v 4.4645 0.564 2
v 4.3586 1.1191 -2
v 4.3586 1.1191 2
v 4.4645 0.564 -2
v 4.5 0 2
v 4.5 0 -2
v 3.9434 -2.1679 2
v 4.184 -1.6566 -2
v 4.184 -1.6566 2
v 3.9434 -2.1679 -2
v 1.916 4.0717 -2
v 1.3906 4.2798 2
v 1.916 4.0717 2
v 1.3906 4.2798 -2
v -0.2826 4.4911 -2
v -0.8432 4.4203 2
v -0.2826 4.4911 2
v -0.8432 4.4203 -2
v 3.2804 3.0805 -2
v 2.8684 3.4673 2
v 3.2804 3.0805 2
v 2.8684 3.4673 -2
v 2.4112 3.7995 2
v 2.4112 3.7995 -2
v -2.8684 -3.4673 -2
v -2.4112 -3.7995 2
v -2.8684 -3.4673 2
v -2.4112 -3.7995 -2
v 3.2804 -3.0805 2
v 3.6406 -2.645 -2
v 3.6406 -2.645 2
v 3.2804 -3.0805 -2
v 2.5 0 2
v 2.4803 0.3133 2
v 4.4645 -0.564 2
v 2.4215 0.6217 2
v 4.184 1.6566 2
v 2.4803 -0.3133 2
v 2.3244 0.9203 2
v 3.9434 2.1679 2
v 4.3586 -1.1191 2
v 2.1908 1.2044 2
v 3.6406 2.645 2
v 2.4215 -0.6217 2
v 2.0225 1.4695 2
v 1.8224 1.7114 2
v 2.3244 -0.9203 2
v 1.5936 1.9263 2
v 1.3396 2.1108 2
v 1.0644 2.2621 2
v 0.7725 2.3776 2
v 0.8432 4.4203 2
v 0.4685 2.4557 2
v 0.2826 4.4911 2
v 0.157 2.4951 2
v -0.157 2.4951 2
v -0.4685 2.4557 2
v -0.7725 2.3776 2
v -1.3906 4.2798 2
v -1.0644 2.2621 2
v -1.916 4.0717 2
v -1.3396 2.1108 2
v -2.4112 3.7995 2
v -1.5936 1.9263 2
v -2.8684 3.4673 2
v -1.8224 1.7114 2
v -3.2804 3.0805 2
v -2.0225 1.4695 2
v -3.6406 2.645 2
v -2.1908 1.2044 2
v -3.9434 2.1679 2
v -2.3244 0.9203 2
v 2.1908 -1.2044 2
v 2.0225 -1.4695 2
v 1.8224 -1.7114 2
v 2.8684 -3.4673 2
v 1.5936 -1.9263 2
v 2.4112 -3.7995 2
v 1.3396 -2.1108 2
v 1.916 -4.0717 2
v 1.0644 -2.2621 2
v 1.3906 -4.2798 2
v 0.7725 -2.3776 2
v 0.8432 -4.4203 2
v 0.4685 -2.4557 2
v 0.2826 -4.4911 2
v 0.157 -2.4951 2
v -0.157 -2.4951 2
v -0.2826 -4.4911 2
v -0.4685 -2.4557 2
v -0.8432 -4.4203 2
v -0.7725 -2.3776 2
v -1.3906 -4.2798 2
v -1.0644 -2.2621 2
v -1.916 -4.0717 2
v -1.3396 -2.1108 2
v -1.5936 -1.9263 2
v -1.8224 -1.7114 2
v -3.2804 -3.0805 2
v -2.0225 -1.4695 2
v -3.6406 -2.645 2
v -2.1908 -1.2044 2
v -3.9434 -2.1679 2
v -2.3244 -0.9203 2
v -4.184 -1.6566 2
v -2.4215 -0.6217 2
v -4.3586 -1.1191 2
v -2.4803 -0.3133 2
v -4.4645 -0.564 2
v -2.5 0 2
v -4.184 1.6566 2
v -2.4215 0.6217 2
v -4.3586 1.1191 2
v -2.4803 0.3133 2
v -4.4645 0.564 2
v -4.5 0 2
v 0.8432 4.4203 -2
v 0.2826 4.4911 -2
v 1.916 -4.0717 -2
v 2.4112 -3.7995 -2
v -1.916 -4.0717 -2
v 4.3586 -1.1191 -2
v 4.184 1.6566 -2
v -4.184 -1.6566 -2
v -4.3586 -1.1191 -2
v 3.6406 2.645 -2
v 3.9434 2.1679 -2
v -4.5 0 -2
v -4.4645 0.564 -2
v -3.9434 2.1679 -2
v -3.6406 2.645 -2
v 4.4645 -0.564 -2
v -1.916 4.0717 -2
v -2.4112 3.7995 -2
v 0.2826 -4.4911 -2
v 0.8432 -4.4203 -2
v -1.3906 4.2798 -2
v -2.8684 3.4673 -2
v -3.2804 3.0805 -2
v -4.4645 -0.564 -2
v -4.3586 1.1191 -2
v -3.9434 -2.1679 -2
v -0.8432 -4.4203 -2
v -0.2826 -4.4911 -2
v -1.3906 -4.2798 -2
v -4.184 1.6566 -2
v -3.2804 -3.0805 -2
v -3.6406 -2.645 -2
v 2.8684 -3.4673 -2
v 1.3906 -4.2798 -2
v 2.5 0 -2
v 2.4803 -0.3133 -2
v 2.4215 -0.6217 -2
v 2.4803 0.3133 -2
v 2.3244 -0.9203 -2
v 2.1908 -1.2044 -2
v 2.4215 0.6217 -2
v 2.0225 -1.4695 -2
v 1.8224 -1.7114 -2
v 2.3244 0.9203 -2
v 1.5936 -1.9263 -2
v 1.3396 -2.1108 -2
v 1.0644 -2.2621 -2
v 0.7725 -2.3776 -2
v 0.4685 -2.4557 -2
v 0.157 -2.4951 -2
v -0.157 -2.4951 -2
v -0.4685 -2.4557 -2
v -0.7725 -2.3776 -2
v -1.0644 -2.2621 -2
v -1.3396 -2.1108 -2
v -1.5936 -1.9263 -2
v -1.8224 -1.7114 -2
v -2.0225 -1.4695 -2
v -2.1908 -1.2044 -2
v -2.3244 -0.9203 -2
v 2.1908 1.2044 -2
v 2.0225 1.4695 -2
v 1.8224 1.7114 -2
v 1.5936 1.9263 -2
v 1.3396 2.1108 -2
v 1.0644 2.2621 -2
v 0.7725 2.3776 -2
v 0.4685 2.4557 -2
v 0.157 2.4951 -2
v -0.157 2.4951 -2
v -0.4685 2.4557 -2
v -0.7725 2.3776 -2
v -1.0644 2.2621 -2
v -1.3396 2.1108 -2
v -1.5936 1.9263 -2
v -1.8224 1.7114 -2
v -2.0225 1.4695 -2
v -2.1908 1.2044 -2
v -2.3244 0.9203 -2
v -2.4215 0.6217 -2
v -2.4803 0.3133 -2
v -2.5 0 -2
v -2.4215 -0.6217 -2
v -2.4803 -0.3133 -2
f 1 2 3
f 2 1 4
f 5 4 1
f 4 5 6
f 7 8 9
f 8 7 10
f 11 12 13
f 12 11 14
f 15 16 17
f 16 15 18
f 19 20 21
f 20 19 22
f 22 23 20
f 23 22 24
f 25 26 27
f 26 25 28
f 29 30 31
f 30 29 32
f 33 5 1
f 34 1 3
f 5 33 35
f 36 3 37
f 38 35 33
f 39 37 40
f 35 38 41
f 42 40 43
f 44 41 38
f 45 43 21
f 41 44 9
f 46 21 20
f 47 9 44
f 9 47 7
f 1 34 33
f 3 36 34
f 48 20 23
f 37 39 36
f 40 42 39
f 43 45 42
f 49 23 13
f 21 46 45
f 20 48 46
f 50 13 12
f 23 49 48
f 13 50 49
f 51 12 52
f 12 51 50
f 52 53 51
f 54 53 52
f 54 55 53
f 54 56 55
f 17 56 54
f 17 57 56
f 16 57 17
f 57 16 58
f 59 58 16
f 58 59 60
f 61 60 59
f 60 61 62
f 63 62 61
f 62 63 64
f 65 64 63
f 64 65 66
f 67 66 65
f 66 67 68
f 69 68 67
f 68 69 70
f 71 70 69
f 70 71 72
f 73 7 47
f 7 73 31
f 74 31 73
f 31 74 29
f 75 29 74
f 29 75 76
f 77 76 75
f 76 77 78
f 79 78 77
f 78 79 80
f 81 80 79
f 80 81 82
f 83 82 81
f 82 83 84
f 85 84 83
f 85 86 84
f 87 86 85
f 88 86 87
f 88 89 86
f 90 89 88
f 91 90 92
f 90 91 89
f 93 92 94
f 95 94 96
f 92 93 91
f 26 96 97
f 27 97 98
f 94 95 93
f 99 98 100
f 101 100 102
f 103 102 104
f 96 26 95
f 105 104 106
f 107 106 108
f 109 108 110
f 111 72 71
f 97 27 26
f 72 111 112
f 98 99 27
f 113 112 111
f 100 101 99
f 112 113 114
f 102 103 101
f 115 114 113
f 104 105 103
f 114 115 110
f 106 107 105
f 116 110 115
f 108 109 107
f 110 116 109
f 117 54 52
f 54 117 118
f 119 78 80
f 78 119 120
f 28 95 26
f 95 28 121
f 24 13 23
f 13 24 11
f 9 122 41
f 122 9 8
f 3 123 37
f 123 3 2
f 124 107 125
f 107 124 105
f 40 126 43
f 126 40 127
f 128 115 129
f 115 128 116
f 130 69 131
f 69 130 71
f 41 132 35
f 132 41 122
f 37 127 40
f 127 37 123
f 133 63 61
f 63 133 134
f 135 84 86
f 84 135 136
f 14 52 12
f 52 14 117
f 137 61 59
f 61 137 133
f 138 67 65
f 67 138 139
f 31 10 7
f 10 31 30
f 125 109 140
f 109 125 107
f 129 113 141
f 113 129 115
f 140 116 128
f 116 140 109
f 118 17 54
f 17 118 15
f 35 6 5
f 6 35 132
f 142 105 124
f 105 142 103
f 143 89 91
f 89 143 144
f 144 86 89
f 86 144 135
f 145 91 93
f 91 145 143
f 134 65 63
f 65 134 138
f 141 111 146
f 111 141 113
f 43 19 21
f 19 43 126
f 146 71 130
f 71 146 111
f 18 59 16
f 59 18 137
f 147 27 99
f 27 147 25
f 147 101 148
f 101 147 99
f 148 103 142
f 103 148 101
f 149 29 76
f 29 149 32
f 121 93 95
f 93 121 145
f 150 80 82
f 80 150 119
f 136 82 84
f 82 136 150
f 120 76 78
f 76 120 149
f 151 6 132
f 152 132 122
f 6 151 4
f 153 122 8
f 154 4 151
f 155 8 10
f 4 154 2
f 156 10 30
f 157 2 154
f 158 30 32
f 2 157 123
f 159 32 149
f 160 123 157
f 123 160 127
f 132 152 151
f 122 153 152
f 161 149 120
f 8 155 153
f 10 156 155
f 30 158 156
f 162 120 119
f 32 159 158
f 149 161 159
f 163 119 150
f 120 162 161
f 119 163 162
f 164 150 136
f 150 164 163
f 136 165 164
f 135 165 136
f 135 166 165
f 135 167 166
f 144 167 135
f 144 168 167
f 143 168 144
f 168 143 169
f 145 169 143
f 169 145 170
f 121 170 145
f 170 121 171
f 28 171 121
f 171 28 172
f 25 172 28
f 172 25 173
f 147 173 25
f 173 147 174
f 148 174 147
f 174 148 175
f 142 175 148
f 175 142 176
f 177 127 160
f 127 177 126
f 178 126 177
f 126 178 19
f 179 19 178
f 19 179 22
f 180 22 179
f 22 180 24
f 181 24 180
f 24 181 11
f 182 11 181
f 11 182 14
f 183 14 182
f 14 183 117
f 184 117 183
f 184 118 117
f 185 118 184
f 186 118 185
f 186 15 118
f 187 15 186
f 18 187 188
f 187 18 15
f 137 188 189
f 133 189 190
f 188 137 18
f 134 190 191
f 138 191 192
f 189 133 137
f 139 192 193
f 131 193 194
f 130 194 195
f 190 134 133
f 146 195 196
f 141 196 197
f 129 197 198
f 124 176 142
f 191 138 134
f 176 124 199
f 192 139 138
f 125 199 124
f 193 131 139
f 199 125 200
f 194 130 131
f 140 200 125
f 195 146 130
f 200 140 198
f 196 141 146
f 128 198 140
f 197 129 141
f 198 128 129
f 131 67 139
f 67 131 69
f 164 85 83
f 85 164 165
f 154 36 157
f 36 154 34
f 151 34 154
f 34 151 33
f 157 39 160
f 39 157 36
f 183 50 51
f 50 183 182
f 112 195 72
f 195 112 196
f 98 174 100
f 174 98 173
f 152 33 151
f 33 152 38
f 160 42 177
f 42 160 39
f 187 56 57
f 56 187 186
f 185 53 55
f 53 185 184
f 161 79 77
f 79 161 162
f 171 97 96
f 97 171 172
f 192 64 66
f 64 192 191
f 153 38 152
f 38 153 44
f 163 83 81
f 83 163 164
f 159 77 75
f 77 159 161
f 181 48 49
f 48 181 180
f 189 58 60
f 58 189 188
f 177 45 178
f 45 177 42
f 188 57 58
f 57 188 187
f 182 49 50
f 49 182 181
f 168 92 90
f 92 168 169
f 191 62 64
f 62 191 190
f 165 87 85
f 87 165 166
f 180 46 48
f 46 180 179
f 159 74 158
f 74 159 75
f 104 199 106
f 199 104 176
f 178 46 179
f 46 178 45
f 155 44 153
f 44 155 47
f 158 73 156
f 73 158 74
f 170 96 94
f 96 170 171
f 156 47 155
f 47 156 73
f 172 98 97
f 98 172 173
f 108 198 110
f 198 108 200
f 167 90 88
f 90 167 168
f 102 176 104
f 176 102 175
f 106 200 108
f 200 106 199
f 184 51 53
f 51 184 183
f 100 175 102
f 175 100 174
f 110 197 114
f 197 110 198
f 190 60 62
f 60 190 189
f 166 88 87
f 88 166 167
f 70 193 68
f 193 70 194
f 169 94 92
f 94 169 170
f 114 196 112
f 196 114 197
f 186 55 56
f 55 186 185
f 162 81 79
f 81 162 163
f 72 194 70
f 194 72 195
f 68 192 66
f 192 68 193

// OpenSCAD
$fn = 50;


difference() {
	union() {
		translate(v = [0, 0, -2.0000000000]) {
			cylinder(h = 4, r = 4.5000000000);
		}
	}
	union() {
		translate(v = [0, 0, -100.0000000000]) {
			cylinder(h = 200, r = 2.5000000000);
		}
	}
}
